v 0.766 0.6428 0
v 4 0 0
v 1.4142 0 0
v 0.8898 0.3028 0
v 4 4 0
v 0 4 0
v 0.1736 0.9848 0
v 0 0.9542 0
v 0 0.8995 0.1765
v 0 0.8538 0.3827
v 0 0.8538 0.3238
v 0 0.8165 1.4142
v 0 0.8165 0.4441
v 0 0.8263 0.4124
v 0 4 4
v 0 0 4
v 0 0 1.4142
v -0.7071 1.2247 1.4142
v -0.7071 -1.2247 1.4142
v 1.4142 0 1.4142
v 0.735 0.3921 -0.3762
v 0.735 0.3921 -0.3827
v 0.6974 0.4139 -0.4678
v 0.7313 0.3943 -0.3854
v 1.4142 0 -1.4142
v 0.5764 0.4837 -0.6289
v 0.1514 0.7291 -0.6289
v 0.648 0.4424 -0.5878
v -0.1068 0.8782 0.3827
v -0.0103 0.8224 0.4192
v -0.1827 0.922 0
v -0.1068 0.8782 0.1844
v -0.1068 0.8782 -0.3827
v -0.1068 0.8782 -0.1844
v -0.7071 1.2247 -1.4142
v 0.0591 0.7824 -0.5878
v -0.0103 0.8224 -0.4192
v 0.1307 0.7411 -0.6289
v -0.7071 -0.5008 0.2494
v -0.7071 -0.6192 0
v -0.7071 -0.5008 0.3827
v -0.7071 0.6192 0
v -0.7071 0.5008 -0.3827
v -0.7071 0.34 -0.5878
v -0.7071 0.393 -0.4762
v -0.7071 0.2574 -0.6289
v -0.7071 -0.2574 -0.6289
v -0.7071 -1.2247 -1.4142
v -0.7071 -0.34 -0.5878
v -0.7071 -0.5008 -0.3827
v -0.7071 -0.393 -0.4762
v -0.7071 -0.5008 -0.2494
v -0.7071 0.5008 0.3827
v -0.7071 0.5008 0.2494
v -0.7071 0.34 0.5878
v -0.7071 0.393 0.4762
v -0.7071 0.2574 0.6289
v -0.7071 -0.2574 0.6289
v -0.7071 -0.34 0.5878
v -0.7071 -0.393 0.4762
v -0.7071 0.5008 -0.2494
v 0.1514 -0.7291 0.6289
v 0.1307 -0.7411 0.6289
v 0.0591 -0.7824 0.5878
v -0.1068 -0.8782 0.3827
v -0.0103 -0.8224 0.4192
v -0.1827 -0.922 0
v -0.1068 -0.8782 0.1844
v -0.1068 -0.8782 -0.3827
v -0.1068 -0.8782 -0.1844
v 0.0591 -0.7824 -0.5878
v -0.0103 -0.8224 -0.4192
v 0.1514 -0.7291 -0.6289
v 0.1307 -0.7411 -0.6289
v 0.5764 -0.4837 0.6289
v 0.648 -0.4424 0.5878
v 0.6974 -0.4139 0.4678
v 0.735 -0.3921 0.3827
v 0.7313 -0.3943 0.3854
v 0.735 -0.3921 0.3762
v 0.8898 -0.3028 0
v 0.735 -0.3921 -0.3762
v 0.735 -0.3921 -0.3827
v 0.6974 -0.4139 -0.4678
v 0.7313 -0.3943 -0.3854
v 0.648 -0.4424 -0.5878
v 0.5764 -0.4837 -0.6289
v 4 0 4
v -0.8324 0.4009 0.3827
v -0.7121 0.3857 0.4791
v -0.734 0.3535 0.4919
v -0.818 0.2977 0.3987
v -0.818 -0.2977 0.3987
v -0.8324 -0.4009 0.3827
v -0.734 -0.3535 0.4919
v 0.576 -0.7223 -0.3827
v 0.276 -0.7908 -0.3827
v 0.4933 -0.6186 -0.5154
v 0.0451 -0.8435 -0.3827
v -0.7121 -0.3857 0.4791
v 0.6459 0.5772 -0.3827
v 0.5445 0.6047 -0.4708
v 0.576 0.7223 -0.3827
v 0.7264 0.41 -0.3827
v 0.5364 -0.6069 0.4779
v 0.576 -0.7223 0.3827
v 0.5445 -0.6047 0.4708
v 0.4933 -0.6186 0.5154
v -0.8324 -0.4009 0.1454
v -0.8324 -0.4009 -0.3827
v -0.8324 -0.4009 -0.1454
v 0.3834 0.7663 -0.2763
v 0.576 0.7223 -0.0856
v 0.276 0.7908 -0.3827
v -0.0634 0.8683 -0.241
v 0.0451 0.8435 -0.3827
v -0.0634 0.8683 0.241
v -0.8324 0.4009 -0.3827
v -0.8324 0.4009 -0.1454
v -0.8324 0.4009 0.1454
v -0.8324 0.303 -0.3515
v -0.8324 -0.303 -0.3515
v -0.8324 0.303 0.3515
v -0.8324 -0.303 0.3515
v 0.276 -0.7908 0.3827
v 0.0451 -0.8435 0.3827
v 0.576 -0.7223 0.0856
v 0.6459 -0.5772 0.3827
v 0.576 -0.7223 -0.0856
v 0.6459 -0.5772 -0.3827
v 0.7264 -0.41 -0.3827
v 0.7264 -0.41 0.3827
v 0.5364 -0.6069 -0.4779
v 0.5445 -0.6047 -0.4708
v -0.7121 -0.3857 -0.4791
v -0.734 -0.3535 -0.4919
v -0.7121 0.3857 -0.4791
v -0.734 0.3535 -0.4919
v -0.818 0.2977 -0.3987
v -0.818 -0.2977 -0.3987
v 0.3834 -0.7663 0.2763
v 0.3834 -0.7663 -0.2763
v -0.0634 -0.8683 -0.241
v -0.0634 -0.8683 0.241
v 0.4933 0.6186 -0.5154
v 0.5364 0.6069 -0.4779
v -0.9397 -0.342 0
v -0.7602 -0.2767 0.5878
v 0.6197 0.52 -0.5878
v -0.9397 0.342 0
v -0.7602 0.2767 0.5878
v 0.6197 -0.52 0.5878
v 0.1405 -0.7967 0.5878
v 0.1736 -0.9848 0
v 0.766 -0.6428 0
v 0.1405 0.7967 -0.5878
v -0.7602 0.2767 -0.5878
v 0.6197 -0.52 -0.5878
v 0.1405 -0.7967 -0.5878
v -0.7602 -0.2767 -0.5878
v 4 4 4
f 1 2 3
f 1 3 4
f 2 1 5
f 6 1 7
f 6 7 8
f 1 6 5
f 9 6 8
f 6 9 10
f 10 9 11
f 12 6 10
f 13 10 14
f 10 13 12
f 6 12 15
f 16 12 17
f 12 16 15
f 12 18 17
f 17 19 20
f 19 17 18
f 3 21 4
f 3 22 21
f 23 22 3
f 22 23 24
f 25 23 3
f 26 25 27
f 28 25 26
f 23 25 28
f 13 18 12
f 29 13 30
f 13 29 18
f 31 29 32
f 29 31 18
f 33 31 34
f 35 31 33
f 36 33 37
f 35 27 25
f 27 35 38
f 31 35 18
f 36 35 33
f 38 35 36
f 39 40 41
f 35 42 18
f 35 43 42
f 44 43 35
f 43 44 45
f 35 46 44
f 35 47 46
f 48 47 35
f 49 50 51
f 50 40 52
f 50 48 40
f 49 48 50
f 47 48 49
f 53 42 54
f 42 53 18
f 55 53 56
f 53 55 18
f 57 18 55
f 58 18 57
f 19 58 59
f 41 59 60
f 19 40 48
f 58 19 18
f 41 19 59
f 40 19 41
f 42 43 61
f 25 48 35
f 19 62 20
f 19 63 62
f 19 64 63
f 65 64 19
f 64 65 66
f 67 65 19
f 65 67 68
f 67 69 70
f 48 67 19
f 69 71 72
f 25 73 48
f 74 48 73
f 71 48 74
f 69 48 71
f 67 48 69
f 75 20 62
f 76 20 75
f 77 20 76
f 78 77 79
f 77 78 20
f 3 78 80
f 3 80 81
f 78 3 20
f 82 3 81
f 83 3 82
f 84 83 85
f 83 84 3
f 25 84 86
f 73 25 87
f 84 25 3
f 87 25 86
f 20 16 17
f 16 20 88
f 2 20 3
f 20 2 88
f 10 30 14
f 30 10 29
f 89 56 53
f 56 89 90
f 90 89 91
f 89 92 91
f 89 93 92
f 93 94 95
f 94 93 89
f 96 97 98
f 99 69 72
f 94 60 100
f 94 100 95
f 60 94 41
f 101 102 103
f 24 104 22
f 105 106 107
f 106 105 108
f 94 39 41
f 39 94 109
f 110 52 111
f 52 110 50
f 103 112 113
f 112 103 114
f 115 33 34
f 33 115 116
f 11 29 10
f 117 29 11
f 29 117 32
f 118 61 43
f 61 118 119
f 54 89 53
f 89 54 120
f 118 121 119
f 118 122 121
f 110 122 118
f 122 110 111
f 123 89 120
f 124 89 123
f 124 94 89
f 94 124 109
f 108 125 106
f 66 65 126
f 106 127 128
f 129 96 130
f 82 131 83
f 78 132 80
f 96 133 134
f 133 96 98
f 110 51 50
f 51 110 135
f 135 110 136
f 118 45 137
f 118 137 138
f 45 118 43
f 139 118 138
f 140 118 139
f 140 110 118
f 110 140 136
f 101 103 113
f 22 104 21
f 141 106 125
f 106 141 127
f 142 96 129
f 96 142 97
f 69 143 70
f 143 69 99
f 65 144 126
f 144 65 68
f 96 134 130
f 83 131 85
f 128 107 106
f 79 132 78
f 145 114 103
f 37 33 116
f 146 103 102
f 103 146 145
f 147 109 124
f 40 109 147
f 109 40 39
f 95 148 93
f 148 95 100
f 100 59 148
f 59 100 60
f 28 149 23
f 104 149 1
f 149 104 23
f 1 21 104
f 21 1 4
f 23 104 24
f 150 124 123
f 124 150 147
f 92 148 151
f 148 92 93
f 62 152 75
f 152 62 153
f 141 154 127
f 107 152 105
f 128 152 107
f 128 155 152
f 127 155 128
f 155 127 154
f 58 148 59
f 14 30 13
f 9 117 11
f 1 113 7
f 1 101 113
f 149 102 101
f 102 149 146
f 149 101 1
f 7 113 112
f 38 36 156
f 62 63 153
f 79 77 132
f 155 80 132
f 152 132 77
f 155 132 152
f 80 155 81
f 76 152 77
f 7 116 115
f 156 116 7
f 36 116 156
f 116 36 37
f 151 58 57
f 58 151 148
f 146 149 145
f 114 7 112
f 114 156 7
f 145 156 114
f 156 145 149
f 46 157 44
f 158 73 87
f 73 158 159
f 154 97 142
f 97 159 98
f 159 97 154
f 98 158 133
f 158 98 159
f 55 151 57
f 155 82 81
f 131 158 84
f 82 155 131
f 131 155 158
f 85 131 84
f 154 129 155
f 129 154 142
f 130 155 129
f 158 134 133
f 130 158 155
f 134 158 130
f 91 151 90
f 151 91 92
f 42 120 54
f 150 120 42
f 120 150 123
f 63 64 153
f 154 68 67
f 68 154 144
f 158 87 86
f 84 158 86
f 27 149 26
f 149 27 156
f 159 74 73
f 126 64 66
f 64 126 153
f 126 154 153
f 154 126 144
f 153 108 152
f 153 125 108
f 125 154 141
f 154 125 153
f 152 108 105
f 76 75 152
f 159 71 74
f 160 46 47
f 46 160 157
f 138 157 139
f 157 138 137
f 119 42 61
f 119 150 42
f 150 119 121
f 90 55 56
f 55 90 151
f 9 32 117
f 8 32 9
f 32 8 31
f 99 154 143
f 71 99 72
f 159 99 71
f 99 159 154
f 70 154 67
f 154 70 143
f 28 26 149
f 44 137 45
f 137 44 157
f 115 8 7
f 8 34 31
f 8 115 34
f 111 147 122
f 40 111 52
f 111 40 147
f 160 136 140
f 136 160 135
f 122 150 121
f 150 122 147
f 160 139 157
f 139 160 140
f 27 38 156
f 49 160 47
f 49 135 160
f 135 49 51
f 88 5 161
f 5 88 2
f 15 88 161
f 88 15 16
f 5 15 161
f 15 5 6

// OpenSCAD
module e() {} e(); module f() { echo("in f"); } f(); echo("x") cube(); assert(true) cube(); translate([1,0]);
module m() { echo($children); children(0); children([0,2]); children([1:2]); children(5); } m() { cube(1); sphere(2); cylinder(); }
module p() { echo(parent_module(0), parent_module(1), $parent_modules); } module q() p(); q();
module m2() { $fn = 7; children(); } m2() sphere(); module n() sphere(); $fn=3; n(); module k($fn=9) sphere(); k();
echo("a"); for (i=[]) cube(); if (false) cube(); let(a=1); assert(true); children(); intersection_for(i=[]) cube(); for(i=[1]); if (true); module m3() children(); m3(); union(); group();
module wrap() { translate([1,0,0]) children(); } module twice() { children(); children(); } twice() wrap() cube();
module outer() inner() children(); module inner() { echo(inner_children = $children); children(); } outer() { sphere(); cube(); }
module withvars() { children(); } withvars() { v = 4; cube(v); }
#translate([1,0,0]) cube(); %group() cube(); module mm() cube(); #mm(); #%cube(); %#cube();
